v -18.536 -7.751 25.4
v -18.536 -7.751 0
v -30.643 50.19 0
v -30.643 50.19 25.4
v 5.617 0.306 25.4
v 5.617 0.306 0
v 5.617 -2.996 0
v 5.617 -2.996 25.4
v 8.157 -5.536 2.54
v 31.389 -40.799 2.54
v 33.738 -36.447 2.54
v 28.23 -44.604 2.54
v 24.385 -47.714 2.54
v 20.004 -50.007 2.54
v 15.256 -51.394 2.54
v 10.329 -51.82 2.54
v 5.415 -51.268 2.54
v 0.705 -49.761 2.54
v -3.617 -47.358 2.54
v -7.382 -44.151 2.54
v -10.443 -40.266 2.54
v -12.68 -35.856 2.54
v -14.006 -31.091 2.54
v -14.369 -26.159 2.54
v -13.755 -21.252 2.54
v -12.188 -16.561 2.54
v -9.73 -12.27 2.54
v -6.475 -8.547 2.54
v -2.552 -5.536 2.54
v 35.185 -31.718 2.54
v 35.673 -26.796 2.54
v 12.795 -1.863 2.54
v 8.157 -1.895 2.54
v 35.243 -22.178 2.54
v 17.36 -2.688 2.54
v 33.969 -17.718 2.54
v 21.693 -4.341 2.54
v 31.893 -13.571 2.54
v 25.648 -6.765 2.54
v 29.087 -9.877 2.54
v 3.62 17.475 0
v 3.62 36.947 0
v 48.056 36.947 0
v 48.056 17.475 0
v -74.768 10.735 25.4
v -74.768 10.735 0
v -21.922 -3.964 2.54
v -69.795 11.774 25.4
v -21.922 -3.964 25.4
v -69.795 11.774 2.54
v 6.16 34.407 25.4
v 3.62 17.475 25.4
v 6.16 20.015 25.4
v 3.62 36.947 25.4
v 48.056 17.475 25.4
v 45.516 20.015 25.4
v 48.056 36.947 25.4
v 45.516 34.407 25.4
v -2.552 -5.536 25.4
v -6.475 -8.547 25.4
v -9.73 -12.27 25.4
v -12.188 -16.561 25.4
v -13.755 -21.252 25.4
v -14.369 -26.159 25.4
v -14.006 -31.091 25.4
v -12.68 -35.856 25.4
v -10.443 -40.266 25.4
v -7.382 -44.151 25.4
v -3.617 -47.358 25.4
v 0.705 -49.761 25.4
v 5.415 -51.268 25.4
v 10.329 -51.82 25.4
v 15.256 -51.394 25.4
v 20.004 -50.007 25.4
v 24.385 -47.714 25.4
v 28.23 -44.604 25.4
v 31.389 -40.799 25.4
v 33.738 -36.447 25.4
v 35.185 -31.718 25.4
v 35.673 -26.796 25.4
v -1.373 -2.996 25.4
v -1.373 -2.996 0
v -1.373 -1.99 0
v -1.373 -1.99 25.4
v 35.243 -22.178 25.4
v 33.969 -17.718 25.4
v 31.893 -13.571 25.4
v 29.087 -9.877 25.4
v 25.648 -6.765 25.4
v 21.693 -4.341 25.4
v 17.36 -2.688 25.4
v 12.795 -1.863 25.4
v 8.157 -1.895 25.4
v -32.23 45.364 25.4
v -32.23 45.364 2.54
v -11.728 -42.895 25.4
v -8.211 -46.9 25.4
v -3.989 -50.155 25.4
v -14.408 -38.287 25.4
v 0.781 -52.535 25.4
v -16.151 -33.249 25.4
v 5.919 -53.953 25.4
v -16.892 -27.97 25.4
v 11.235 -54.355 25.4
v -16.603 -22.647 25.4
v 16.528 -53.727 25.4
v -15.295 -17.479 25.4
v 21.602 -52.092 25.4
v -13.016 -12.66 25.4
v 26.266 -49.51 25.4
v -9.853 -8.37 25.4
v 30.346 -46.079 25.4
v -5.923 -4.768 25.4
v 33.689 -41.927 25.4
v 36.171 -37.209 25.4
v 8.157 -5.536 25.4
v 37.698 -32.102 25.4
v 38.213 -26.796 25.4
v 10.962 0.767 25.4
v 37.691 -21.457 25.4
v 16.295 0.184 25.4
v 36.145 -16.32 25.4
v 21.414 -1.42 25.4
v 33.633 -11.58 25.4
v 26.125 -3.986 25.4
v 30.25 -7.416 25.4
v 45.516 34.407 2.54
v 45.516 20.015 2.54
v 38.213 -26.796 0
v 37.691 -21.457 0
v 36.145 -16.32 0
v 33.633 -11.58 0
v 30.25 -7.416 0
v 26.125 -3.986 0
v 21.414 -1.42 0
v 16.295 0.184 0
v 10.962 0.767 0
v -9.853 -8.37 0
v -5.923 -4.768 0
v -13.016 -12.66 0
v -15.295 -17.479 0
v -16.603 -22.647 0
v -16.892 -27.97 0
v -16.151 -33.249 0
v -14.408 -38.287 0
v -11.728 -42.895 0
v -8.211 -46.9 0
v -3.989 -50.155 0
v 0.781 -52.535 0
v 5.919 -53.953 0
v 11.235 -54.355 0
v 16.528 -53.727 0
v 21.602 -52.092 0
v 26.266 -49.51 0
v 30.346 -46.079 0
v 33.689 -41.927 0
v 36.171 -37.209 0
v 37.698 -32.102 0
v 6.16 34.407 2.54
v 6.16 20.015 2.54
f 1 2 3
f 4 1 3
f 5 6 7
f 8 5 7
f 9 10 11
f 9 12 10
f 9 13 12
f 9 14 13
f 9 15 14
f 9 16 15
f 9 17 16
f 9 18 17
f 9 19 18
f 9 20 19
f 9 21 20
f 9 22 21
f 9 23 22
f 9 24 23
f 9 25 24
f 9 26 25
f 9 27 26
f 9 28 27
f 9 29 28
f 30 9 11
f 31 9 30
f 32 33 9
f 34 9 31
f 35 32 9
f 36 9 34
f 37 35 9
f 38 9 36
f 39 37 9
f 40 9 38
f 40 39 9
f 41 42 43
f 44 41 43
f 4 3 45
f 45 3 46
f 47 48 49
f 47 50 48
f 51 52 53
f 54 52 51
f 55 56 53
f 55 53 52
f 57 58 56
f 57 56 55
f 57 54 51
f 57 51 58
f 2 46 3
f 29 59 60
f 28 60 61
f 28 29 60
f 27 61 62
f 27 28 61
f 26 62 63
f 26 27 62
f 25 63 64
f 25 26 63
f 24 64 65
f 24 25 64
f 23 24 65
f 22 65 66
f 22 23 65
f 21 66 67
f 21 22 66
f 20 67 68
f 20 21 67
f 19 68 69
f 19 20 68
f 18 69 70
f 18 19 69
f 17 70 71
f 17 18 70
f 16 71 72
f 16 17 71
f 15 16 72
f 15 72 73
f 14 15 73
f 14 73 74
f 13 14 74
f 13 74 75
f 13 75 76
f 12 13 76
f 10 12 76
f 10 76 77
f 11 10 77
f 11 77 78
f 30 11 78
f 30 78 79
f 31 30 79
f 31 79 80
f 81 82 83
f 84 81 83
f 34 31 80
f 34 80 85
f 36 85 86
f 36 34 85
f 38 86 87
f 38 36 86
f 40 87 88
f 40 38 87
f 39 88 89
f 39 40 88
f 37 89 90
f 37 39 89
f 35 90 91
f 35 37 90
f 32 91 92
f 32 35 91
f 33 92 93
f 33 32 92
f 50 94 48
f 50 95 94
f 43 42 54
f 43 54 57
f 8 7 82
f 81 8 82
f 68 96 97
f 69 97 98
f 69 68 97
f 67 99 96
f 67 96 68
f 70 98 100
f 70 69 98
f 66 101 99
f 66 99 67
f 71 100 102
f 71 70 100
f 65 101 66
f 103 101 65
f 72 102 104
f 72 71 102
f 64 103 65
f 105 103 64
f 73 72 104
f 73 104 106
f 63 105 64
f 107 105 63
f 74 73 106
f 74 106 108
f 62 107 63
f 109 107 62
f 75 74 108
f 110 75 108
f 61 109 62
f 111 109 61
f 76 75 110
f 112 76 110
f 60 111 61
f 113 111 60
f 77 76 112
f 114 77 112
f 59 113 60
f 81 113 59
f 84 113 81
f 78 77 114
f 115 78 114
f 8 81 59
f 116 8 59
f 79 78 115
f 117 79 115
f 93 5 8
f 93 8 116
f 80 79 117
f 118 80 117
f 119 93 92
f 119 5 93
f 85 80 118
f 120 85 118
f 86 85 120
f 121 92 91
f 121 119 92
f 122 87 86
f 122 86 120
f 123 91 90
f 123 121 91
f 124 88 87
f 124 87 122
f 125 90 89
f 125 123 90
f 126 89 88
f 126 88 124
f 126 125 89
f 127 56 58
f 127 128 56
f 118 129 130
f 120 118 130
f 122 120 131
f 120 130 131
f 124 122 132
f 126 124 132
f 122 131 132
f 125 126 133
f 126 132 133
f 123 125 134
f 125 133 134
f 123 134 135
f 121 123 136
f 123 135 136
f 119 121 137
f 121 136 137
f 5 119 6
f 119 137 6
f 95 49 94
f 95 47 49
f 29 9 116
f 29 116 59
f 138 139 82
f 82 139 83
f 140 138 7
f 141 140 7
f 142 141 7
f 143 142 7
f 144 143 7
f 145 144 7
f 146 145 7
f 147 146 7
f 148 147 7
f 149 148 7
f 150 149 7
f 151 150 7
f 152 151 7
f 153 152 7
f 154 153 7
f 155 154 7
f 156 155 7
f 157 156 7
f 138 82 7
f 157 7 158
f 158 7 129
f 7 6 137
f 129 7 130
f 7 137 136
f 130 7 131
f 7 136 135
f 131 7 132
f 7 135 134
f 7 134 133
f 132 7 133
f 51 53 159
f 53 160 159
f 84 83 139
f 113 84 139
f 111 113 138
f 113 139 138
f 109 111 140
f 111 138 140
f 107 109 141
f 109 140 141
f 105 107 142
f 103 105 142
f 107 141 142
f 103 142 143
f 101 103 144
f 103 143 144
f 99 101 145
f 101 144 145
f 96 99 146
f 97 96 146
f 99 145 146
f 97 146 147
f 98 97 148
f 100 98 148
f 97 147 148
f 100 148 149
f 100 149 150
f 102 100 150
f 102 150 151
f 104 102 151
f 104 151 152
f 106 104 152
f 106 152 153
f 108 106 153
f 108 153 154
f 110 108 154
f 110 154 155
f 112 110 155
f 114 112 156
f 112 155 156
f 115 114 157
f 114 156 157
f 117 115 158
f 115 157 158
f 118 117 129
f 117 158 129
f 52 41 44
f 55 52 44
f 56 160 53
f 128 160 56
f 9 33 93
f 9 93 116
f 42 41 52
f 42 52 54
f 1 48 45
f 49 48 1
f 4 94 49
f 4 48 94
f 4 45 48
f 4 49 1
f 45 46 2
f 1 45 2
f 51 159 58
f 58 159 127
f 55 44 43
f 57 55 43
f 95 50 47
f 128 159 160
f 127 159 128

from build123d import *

# Parameters (mm, degrees)
F1_DEPTH      = 25.4
F0_W          = 44.4361274131
F0_H          = 19.472014159
F2_T          = -2.54
F2_2_T        = 2.54
F2_2_T3_DEPTH = 30.48
F2_3_T        = -2.54


# Not quite as in the source:
# - a shell that OpenCascade refuses in one call is made with other operations: the cavity is built on its own and cut out


with BuildPart() as f1:
    # F0 (on Top) → F1 (new body)
    with BuildSketch(Plane.XY):
        with BuildLine():
            Line((5.6169265881, 0.3058068698), (5.6169265881, -2.9956940562))
            Line((5.6169265881, -2.9956940562), (-1.3730227947, -2.9956940562))
            Line((-1.3730227947, -2.9956940562), (-1.3730227947, -1.9904286039))
            ThreePointArc((-1.3730227947, -1.9904286039), (-3.9889147019, -50.1545199575), (38.2132269141, -26.7963986844))
            ThreePointArc((38.2132269141, -26.7963986844), (28.2712658833, -5.6005952033), (5.6169265881, 0.3058068698))
        make_face()
    extrude(amount=F1_DEPTH)

    # F2#2: shell of thickness 2.54, made by hand


with BuildPart() as f1b:
    # F0 (on Top) → F1, piece 2 (new body)
    with BuildSketch(Plane.XY):
        Polygon((-18.5361797645, -7.750711828), (-30.6431320772, 50.1897106464), (-74.7675336897, 10.734571144), align=None)
    extrude(amount=F1_DEPTH)

    # F2
    f2_openings = [f1b.faces().sort_by_distance(p)[0] for p in [
        (-41.315615, 17.724523, 25.4),
    ]]
    offset(amount=F2_T, openings=f2_openings)


with BuildPart() as f1c:
    # F0 (on Top) → F1, piece 3 (new body)
    with BuildSketch(Plane.XY):
        with Locations((25.8378628641, 27.2108893842)):
            Rectangle(F0_W, F0_H)
    extrude(amount=F1_DEPTH)

    # F2#3
    f2_3_openings = [f1c.faces().sort_by_distance(p)[0] for p in [
        (25.837863, 27.210889, 25.4),
    ]]
    offset(amount=F2_3_T, openings=f2_3_openings)


with BuildPart() as f2_2_core1:
    # F2_2_t2: copy of F1
    add(f1.part)

    # the walls: a layer under each face that stays
    f2_2_faces = [f2_2_core1.faces().sort_by_distance(p)[0] for p in [
        (5.6169265881, -1.3449435932, 12.7),
        (2.1219518967, -2.9956940562, 12.7),
        (-1.3730227947, -2.4930613301, 12.7),
        (-3.9889147019, -50.1545199575, 12.7),
        (28.2712658833, -5.6005952033, 12.7),
        (10.6480075046, -26.7963986844, 0),
    ]]
    thicken(f2_2_faces, amount=-F2_2_T, mode=Mode.SUBTRACT)

    # F2_2_s4 → F2_2_t3 (cut)
    with BuildSketch(Plane.XY.offset(-2.54)):
        Polygon((5.5915265881, -2.9702940562), (8.1569265881, -2.9956940562), (8.1569265881, -5.5356940562), (5.6169265881, -5.5356940562), align=None)
        Polygon((-1.3476227947, -2.9702940562), (-1.3730227947, -5.5356940562), (-3.9130227947, -5.5356940562), (-3.9130227947, -2.9956940562), align=None)
    extrude(amount=F2_2_T3_DEPTH, mode=Mode.SUBTRACT)


with BuildPart() as f1_1:
    add(f1.part)

    # what is left inside the walls is the cavity
    f2_2_cavity = [f2_2_core1.part.solids().sort_by_distance(p)[0] for p in [
        (-1.503628, -48.644253, 17.78),
    ]]
    add(f2_2_cavity, mode=Mode.SUBTRACT)


solid = Compound([f1b.part, f1c.part, f1_1.part])
